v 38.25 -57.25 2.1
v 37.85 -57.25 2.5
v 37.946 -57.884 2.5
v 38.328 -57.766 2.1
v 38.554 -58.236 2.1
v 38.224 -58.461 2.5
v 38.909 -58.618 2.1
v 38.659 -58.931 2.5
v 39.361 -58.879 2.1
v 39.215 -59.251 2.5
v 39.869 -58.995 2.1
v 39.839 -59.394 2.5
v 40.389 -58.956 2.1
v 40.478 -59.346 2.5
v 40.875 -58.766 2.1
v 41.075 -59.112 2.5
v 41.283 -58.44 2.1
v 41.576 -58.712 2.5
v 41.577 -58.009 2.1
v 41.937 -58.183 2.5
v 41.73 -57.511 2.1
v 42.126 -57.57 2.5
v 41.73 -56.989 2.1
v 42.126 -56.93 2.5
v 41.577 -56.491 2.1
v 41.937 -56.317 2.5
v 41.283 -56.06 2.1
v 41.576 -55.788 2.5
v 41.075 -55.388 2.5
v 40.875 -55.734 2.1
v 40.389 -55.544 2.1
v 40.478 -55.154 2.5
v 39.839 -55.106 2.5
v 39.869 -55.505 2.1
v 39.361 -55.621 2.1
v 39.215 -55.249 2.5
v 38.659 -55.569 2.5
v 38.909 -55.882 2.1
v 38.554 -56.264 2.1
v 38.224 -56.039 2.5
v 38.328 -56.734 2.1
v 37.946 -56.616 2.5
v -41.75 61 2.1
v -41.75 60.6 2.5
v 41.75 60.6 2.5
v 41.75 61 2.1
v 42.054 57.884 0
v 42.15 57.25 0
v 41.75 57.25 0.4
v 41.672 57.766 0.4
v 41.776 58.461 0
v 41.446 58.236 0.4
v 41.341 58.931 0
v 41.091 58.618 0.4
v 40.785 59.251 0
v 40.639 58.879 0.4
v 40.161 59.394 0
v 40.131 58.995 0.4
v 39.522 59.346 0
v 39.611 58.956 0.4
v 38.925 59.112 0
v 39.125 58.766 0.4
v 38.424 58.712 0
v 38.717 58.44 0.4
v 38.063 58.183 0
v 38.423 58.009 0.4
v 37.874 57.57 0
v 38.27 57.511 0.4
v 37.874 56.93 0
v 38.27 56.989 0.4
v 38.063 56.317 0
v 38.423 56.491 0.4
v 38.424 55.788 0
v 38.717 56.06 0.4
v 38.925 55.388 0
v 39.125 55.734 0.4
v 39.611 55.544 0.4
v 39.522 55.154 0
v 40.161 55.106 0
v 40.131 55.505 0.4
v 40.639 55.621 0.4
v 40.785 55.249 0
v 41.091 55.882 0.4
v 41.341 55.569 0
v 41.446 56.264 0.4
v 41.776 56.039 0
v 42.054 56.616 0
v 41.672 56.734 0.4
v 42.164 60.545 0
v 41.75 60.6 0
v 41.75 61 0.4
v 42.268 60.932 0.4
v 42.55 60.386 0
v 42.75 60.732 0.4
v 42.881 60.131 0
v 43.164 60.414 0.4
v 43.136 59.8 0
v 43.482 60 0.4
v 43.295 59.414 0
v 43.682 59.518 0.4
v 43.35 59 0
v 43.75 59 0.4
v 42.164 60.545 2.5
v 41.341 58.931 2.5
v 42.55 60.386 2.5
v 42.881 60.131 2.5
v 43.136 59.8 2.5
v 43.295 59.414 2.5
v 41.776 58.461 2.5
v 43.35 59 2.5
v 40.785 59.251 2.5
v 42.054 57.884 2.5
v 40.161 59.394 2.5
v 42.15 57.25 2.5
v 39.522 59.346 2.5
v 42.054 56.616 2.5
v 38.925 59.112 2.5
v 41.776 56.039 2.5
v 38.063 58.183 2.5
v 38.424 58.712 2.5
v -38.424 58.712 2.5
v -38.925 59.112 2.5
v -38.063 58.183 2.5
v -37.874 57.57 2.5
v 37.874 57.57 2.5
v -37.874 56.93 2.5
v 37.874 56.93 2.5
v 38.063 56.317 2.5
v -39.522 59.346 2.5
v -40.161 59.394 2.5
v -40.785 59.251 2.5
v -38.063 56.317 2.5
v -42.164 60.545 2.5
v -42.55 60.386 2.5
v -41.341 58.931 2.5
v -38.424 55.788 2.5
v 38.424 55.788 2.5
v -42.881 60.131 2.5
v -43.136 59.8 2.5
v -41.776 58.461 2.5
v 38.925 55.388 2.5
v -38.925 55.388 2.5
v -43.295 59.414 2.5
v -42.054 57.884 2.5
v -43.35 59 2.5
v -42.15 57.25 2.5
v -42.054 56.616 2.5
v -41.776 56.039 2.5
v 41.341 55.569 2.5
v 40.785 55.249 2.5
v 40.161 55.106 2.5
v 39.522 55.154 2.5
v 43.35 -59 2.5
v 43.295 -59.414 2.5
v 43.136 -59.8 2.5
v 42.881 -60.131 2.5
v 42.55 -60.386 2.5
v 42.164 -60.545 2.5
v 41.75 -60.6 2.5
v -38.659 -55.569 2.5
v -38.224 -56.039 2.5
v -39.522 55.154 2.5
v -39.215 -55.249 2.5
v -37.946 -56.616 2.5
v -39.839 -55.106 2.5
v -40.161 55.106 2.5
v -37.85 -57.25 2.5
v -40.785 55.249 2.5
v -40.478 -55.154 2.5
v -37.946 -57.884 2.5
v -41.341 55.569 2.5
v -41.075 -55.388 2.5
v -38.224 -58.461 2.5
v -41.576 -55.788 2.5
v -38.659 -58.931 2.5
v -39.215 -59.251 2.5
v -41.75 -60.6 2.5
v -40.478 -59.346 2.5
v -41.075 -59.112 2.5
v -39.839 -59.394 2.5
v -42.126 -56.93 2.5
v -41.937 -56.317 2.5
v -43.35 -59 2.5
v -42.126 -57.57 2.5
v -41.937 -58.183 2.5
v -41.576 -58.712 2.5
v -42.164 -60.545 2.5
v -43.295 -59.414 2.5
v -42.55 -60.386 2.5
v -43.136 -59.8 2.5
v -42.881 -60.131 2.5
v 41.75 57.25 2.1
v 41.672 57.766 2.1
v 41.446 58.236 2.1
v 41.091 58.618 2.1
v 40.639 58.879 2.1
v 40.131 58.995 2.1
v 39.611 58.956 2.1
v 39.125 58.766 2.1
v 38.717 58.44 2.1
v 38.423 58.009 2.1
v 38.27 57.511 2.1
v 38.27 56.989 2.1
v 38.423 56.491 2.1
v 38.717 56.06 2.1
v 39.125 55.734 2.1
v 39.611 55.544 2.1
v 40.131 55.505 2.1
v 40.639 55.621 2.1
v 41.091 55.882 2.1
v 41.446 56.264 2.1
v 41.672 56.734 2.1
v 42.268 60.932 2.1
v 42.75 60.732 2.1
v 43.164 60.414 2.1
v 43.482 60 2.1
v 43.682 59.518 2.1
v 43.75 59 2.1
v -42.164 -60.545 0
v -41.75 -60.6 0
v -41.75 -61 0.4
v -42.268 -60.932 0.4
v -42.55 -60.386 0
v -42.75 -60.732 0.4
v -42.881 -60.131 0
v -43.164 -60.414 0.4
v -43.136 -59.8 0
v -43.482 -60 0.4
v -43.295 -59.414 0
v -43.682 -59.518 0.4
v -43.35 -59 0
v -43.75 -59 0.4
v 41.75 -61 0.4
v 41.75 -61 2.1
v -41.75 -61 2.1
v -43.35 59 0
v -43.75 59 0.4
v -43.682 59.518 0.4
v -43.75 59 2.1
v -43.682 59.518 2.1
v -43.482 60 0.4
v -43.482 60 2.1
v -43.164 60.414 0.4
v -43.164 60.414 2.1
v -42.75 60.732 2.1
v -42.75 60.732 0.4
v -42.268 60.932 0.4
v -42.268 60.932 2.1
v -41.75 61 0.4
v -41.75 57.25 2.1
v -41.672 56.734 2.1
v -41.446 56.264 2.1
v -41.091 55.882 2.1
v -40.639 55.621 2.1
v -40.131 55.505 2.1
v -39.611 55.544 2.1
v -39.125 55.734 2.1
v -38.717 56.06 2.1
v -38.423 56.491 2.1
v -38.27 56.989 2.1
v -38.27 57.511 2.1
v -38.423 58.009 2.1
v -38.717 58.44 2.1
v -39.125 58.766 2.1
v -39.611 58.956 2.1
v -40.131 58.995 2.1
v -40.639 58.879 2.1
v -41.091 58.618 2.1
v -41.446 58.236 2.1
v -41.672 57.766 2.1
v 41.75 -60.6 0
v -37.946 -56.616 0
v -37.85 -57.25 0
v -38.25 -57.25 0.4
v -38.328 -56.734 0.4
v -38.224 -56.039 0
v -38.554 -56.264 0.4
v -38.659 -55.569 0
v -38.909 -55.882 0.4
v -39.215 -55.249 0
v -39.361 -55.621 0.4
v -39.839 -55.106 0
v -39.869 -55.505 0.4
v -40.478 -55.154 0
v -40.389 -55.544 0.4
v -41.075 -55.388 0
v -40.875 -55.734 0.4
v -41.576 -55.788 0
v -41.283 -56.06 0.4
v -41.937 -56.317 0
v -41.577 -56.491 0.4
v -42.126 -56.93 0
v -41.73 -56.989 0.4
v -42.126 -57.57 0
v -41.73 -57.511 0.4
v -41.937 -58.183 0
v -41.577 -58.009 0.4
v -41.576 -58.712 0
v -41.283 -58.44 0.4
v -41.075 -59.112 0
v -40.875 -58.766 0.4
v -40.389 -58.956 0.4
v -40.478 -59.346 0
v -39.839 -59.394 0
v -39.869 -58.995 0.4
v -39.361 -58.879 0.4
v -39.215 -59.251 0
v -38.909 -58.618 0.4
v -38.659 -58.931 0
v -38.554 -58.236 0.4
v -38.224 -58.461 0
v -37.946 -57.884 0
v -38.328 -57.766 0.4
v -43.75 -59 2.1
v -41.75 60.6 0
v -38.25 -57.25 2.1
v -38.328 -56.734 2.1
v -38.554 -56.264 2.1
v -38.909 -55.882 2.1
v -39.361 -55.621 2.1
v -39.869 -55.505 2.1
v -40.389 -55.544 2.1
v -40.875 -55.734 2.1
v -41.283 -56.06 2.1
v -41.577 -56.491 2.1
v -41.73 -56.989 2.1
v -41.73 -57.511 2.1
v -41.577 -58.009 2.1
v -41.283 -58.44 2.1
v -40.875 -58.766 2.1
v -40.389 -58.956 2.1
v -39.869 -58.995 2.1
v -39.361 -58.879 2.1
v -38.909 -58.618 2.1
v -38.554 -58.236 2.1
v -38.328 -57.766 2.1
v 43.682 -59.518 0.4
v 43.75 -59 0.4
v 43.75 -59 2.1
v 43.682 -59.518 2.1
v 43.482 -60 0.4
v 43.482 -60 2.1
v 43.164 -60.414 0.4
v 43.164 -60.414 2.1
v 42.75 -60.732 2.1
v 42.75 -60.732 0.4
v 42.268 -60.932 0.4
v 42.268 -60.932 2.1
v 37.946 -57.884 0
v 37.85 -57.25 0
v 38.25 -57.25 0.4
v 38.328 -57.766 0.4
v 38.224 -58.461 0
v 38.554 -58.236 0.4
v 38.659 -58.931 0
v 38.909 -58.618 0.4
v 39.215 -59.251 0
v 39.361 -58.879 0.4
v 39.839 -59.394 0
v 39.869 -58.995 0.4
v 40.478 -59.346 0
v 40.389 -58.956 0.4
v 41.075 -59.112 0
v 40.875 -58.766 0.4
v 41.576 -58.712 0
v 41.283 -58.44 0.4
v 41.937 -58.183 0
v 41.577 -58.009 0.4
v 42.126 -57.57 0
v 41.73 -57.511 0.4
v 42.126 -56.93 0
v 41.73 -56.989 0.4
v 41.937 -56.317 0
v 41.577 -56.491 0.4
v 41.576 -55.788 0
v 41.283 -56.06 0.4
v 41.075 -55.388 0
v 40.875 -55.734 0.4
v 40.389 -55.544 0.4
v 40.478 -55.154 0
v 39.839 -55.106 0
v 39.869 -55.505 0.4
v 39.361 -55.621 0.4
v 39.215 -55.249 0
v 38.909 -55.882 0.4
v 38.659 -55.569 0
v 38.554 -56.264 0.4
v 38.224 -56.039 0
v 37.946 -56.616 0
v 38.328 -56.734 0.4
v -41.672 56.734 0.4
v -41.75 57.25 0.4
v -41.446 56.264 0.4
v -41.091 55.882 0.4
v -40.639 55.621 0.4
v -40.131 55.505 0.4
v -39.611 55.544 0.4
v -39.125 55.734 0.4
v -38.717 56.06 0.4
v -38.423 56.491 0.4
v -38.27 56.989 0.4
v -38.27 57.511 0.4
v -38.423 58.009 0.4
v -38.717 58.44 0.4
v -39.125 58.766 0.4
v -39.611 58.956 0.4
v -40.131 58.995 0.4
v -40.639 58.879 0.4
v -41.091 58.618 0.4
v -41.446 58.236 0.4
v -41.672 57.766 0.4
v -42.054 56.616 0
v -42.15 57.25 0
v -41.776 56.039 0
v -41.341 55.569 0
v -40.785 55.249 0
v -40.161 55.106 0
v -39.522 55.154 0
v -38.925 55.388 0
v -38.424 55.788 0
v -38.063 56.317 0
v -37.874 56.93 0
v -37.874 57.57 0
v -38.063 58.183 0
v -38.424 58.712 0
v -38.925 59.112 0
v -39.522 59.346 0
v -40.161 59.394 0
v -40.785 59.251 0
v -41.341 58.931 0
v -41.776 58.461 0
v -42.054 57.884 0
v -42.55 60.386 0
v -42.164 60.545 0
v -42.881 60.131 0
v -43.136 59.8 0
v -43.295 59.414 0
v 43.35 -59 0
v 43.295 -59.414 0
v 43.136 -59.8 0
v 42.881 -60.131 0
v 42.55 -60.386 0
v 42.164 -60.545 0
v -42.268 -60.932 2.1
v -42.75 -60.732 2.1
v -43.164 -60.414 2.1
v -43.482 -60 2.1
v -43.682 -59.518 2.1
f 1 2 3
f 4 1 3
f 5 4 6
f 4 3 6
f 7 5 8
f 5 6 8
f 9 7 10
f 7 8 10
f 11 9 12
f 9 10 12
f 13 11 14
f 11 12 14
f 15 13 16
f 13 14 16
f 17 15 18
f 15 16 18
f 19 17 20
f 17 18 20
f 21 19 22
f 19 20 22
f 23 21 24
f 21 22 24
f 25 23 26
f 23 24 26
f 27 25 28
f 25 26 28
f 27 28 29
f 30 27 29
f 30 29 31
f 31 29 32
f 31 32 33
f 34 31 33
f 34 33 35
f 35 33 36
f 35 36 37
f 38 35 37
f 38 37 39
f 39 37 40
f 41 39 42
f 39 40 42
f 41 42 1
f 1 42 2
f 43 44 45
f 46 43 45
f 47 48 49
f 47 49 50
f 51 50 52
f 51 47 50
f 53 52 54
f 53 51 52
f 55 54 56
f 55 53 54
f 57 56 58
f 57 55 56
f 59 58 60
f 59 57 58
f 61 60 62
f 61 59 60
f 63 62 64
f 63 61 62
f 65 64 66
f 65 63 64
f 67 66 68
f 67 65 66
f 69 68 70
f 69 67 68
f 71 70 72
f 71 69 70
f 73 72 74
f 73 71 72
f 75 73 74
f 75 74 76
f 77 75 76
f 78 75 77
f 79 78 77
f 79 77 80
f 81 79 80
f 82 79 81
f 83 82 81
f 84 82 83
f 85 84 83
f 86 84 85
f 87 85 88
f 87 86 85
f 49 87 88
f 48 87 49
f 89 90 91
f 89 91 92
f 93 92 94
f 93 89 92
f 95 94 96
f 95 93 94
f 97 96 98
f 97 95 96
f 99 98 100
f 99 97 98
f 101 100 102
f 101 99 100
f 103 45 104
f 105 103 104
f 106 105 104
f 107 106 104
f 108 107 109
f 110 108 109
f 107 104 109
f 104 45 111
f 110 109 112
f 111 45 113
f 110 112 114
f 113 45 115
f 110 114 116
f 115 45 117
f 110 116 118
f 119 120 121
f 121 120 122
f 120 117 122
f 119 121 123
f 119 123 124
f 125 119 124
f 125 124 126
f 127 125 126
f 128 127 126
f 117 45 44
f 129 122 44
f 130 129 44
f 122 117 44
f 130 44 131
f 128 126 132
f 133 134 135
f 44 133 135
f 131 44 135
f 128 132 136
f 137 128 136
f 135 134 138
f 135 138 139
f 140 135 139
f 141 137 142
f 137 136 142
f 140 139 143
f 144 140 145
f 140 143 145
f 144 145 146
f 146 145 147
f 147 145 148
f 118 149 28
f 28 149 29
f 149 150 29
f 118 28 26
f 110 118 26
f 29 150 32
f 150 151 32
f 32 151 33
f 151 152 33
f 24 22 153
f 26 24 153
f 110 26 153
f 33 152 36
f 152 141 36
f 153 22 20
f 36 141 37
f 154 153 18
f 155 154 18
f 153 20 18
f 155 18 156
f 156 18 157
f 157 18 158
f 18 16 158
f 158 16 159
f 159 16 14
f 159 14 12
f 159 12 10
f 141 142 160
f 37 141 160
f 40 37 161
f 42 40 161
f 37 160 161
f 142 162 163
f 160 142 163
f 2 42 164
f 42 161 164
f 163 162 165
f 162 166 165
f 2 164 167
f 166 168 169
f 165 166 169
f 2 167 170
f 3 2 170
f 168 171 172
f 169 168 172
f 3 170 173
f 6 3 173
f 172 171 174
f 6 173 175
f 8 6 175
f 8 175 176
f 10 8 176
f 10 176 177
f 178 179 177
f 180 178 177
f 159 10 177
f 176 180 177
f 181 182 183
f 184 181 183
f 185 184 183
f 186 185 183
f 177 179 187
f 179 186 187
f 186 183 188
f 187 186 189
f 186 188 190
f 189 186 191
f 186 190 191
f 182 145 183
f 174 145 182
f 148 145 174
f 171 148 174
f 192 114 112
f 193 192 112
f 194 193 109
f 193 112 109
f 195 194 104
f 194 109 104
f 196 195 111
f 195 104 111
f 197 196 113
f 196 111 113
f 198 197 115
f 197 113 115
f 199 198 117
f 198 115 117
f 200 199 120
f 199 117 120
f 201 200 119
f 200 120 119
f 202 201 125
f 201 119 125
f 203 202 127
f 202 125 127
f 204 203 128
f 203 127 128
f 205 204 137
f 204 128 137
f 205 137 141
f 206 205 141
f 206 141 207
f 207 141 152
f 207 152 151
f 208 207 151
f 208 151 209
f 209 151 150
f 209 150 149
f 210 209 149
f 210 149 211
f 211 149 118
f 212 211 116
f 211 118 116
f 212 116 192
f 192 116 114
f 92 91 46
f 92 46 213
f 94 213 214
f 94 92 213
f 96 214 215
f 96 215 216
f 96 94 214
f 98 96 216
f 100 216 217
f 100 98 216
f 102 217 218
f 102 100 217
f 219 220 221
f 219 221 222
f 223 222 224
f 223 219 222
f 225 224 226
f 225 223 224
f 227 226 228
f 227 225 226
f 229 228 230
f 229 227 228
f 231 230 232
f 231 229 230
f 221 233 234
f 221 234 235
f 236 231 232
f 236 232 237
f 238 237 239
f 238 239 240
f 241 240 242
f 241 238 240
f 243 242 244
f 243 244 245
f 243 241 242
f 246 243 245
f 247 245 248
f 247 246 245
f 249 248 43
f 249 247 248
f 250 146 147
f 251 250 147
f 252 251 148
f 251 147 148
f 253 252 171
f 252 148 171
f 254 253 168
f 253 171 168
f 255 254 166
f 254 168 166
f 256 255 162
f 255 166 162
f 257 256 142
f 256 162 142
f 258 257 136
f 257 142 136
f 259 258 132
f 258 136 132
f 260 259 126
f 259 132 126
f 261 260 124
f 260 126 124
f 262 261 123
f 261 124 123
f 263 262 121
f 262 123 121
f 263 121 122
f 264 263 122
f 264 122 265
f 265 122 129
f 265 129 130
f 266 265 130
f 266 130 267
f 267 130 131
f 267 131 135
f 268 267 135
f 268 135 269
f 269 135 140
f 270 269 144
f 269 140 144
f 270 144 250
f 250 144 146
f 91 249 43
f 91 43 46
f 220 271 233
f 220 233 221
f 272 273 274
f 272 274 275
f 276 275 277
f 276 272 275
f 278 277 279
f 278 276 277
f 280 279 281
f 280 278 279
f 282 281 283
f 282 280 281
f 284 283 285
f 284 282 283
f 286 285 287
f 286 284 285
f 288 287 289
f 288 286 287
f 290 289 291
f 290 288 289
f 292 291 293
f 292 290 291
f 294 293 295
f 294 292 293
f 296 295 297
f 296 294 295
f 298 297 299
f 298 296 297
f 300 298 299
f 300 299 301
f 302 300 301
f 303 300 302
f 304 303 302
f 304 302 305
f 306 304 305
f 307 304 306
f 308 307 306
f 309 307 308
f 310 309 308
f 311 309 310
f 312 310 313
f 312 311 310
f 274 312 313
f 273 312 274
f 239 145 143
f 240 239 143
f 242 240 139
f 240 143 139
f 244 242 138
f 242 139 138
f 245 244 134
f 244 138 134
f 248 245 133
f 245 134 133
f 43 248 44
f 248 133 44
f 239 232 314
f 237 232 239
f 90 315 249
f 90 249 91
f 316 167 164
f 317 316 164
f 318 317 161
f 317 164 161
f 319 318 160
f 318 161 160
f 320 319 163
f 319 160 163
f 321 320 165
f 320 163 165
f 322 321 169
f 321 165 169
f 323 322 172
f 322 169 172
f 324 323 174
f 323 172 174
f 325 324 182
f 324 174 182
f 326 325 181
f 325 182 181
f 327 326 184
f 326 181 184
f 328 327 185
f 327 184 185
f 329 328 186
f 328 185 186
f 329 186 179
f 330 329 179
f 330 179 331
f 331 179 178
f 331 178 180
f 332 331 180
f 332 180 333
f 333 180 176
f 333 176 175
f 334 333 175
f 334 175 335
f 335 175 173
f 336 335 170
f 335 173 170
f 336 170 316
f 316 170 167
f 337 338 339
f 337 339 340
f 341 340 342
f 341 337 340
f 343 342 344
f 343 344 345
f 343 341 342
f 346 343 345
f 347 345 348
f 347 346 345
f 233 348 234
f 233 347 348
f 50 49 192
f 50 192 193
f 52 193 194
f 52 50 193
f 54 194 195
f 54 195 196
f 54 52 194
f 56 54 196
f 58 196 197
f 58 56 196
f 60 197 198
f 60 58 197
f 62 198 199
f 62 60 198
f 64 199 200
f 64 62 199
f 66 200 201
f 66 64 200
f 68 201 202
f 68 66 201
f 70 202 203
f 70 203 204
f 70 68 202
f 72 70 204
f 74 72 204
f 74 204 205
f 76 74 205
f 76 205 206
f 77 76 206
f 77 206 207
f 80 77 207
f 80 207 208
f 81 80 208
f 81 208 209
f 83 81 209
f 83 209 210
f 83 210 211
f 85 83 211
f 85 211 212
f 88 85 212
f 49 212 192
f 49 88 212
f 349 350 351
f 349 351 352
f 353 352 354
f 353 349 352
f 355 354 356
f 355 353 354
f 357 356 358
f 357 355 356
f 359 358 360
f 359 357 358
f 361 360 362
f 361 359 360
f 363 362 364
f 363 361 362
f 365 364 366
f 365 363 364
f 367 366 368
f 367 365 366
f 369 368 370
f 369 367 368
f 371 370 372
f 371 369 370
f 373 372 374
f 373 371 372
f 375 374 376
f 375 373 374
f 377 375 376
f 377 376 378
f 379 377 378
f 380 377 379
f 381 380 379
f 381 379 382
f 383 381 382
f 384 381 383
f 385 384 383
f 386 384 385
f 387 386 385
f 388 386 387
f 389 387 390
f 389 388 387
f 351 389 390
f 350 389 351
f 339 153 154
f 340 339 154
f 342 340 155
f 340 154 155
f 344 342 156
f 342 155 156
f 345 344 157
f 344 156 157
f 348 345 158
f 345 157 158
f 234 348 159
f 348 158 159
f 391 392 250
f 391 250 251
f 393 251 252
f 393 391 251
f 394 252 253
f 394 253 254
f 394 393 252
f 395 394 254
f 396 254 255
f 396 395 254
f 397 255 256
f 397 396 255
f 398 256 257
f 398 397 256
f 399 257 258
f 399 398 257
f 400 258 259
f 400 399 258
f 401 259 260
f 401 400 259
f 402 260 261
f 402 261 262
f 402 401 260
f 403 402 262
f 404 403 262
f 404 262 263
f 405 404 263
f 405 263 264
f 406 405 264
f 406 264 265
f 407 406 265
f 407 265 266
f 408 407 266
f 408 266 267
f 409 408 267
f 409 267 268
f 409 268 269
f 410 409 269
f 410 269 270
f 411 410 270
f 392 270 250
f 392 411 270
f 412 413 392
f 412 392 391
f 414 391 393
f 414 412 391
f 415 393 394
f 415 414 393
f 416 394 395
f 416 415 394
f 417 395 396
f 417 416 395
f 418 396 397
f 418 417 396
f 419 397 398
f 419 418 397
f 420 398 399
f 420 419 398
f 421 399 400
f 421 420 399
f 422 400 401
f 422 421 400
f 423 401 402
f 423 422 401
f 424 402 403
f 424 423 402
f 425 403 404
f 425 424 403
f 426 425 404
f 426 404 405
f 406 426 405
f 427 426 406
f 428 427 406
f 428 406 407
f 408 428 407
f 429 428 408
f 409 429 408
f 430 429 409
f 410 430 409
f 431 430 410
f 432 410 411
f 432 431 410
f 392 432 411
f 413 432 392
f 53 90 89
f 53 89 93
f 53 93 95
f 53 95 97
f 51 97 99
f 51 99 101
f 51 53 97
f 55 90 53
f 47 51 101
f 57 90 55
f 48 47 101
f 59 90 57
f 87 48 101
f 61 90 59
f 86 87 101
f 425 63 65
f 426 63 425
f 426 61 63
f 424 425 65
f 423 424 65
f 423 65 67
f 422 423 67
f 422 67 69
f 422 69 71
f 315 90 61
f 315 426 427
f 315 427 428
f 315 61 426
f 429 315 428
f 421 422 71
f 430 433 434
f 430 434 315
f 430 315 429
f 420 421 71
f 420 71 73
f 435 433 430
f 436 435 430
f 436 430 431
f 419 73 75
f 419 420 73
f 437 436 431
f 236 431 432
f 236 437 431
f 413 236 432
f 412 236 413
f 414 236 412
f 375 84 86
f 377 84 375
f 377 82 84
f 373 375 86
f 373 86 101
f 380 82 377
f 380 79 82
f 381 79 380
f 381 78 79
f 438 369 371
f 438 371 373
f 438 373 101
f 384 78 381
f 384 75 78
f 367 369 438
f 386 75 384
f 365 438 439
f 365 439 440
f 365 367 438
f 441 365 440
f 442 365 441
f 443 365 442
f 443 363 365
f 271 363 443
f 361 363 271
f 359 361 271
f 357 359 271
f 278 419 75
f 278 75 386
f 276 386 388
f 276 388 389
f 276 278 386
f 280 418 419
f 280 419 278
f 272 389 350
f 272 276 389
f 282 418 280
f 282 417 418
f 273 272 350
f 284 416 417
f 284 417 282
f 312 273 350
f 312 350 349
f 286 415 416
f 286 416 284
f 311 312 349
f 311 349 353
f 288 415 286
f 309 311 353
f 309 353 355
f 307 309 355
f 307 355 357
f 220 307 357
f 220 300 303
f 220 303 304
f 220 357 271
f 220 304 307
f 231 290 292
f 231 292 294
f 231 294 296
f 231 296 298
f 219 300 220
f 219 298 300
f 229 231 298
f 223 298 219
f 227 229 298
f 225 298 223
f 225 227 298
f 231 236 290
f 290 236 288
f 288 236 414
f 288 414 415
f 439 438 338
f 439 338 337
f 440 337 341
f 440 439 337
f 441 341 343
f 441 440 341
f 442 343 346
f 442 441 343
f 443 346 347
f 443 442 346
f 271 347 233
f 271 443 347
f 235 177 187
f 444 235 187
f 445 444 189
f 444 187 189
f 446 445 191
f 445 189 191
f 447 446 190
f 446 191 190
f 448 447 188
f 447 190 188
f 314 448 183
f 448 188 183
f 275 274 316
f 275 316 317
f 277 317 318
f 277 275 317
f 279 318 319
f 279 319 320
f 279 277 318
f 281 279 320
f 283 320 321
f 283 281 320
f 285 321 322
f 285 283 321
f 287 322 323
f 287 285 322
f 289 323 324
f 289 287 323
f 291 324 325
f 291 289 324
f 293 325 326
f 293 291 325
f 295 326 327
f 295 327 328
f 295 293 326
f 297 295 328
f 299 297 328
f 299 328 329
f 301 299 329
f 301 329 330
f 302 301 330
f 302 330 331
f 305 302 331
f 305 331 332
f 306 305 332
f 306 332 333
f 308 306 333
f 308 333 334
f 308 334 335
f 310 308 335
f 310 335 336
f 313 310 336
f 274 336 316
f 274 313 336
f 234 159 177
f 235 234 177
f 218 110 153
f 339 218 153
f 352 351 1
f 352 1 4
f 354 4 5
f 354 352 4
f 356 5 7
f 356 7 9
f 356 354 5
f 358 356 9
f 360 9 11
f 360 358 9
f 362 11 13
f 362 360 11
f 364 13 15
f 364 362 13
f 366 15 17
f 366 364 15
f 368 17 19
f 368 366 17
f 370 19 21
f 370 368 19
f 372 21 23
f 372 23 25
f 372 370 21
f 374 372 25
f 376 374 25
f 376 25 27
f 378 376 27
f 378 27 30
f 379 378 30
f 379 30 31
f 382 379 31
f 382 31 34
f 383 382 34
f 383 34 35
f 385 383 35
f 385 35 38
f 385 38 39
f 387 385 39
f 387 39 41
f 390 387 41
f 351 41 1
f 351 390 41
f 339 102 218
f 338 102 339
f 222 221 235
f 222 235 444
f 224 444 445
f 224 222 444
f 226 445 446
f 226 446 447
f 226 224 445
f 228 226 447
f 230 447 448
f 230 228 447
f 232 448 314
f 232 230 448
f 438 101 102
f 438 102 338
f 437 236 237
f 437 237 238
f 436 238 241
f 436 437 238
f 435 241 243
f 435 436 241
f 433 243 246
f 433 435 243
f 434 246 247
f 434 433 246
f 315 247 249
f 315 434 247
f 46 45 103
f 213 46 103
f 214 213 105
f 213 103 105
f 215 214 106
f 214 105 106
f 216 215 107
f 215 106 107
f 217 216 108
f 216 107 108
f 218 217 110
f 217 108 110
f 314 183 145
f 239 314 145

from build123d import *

# Parameters (mm, degrees)
SKIZZE1_R                       = 1.75
AUFSATZ_LINEAR_AUSTRAGEN1_DEPTH = 2.5
FASE1_SIZE                      = 0.4


with BuildPart() as part:
    # Skizze1 → Aufsatz-Linear austragen1 (new body)
    with BuildSketch(Plane(origin=(0, 0, 0), x_dir=(0, 1, 0), z_dir=(0, 0, 1))):
        with BuildLine():
            Line((59, -43.75), (-59, -43.75))
            ThreePointArc((-59, -43.75), (-60.414213562, -43.164213562), (-61, -41.75))
            Line((-61, -41.75), (-61, 41.75))
            ThreePointArc((-61, 41.75), (-60.414213562, 43.164213562), (-59, 43.75))
            Line((-59, 43.75), (59, 43.75))
            ThreePointArc((59, 43.75), (60.414213562, 43.164213562), (61, 41.75))
            Line((61, 41.75), (61, -41.75))
            ThreePointArc((61, -41.75), (60.414213562, -43.164213562), (59, -43.75))
        make_face()
        with Locations(Location((-57.25, 40, 0), (0, 0, 270))):
            Circle(SKIZZE1_R, mode=Mode.SUBTRACT)
        with Locations(Location((57.25, 40, 0), (0, 0, 90))):
            Circle(SKIZZE1_R, mode=Mode.SUBTRACT)
        with Locations(Location((57.25, -40, 0), (0, 0, 270))):
            Circle(SKIZZE1_R, mode=Mode.SUBTRACT)
        with Locations(Location((-57.25, -40, 0), (0, 0, 90))):
            Circle(SKIZZE1_R, mode=Mode.SUBTRACT)
    extrude(amount=AUFSATZ_LINEAR_AUSTRAGEN1_DEPTH)

    # Fase1
    fase1_edges = [part.edges().sort_by_distance(p)[0] for p in [
        (0, 61, 0),
        (43.164213562, 60.414213562, 0),
        (43.75, 0, 0),
        (43.164213562, -60.414213562, 0),
        (43.164213562, 60.414213562, 2.5),
        (0, 61, 2.5),
        (-43.164213562, 60.414213562, 2.5),
        (-38.25, 57.25, 0),
        (-38.25, 57.25, 2.5),
        (-43.75, 0, 2.5),
        (-41.75, -57.25, 0),
        (-41.75, -57.25, 2.5),
        (-43.164213562, -60.414213562, 2.5),
        (38.25, 57.25, 0),
        (38.25, 57.25, 2.5),
        (0, -61, 2.5),
        (41.75, -57.25, 0),
        (41.75, -57.25, 2.5),
        (43.164213562, -60.414213562, 2.5),
        (0, -61, 0),
        (43.75, 0, 2.5),
        (-43.164213562, -60.414213562, 0),
        (-43.75, 0, 0),
        (-43.164213562, 60.414213562, 0),
    ]]
    chamfer(fase1_edges, length=FASE1_SIZE)


solid = part.part
